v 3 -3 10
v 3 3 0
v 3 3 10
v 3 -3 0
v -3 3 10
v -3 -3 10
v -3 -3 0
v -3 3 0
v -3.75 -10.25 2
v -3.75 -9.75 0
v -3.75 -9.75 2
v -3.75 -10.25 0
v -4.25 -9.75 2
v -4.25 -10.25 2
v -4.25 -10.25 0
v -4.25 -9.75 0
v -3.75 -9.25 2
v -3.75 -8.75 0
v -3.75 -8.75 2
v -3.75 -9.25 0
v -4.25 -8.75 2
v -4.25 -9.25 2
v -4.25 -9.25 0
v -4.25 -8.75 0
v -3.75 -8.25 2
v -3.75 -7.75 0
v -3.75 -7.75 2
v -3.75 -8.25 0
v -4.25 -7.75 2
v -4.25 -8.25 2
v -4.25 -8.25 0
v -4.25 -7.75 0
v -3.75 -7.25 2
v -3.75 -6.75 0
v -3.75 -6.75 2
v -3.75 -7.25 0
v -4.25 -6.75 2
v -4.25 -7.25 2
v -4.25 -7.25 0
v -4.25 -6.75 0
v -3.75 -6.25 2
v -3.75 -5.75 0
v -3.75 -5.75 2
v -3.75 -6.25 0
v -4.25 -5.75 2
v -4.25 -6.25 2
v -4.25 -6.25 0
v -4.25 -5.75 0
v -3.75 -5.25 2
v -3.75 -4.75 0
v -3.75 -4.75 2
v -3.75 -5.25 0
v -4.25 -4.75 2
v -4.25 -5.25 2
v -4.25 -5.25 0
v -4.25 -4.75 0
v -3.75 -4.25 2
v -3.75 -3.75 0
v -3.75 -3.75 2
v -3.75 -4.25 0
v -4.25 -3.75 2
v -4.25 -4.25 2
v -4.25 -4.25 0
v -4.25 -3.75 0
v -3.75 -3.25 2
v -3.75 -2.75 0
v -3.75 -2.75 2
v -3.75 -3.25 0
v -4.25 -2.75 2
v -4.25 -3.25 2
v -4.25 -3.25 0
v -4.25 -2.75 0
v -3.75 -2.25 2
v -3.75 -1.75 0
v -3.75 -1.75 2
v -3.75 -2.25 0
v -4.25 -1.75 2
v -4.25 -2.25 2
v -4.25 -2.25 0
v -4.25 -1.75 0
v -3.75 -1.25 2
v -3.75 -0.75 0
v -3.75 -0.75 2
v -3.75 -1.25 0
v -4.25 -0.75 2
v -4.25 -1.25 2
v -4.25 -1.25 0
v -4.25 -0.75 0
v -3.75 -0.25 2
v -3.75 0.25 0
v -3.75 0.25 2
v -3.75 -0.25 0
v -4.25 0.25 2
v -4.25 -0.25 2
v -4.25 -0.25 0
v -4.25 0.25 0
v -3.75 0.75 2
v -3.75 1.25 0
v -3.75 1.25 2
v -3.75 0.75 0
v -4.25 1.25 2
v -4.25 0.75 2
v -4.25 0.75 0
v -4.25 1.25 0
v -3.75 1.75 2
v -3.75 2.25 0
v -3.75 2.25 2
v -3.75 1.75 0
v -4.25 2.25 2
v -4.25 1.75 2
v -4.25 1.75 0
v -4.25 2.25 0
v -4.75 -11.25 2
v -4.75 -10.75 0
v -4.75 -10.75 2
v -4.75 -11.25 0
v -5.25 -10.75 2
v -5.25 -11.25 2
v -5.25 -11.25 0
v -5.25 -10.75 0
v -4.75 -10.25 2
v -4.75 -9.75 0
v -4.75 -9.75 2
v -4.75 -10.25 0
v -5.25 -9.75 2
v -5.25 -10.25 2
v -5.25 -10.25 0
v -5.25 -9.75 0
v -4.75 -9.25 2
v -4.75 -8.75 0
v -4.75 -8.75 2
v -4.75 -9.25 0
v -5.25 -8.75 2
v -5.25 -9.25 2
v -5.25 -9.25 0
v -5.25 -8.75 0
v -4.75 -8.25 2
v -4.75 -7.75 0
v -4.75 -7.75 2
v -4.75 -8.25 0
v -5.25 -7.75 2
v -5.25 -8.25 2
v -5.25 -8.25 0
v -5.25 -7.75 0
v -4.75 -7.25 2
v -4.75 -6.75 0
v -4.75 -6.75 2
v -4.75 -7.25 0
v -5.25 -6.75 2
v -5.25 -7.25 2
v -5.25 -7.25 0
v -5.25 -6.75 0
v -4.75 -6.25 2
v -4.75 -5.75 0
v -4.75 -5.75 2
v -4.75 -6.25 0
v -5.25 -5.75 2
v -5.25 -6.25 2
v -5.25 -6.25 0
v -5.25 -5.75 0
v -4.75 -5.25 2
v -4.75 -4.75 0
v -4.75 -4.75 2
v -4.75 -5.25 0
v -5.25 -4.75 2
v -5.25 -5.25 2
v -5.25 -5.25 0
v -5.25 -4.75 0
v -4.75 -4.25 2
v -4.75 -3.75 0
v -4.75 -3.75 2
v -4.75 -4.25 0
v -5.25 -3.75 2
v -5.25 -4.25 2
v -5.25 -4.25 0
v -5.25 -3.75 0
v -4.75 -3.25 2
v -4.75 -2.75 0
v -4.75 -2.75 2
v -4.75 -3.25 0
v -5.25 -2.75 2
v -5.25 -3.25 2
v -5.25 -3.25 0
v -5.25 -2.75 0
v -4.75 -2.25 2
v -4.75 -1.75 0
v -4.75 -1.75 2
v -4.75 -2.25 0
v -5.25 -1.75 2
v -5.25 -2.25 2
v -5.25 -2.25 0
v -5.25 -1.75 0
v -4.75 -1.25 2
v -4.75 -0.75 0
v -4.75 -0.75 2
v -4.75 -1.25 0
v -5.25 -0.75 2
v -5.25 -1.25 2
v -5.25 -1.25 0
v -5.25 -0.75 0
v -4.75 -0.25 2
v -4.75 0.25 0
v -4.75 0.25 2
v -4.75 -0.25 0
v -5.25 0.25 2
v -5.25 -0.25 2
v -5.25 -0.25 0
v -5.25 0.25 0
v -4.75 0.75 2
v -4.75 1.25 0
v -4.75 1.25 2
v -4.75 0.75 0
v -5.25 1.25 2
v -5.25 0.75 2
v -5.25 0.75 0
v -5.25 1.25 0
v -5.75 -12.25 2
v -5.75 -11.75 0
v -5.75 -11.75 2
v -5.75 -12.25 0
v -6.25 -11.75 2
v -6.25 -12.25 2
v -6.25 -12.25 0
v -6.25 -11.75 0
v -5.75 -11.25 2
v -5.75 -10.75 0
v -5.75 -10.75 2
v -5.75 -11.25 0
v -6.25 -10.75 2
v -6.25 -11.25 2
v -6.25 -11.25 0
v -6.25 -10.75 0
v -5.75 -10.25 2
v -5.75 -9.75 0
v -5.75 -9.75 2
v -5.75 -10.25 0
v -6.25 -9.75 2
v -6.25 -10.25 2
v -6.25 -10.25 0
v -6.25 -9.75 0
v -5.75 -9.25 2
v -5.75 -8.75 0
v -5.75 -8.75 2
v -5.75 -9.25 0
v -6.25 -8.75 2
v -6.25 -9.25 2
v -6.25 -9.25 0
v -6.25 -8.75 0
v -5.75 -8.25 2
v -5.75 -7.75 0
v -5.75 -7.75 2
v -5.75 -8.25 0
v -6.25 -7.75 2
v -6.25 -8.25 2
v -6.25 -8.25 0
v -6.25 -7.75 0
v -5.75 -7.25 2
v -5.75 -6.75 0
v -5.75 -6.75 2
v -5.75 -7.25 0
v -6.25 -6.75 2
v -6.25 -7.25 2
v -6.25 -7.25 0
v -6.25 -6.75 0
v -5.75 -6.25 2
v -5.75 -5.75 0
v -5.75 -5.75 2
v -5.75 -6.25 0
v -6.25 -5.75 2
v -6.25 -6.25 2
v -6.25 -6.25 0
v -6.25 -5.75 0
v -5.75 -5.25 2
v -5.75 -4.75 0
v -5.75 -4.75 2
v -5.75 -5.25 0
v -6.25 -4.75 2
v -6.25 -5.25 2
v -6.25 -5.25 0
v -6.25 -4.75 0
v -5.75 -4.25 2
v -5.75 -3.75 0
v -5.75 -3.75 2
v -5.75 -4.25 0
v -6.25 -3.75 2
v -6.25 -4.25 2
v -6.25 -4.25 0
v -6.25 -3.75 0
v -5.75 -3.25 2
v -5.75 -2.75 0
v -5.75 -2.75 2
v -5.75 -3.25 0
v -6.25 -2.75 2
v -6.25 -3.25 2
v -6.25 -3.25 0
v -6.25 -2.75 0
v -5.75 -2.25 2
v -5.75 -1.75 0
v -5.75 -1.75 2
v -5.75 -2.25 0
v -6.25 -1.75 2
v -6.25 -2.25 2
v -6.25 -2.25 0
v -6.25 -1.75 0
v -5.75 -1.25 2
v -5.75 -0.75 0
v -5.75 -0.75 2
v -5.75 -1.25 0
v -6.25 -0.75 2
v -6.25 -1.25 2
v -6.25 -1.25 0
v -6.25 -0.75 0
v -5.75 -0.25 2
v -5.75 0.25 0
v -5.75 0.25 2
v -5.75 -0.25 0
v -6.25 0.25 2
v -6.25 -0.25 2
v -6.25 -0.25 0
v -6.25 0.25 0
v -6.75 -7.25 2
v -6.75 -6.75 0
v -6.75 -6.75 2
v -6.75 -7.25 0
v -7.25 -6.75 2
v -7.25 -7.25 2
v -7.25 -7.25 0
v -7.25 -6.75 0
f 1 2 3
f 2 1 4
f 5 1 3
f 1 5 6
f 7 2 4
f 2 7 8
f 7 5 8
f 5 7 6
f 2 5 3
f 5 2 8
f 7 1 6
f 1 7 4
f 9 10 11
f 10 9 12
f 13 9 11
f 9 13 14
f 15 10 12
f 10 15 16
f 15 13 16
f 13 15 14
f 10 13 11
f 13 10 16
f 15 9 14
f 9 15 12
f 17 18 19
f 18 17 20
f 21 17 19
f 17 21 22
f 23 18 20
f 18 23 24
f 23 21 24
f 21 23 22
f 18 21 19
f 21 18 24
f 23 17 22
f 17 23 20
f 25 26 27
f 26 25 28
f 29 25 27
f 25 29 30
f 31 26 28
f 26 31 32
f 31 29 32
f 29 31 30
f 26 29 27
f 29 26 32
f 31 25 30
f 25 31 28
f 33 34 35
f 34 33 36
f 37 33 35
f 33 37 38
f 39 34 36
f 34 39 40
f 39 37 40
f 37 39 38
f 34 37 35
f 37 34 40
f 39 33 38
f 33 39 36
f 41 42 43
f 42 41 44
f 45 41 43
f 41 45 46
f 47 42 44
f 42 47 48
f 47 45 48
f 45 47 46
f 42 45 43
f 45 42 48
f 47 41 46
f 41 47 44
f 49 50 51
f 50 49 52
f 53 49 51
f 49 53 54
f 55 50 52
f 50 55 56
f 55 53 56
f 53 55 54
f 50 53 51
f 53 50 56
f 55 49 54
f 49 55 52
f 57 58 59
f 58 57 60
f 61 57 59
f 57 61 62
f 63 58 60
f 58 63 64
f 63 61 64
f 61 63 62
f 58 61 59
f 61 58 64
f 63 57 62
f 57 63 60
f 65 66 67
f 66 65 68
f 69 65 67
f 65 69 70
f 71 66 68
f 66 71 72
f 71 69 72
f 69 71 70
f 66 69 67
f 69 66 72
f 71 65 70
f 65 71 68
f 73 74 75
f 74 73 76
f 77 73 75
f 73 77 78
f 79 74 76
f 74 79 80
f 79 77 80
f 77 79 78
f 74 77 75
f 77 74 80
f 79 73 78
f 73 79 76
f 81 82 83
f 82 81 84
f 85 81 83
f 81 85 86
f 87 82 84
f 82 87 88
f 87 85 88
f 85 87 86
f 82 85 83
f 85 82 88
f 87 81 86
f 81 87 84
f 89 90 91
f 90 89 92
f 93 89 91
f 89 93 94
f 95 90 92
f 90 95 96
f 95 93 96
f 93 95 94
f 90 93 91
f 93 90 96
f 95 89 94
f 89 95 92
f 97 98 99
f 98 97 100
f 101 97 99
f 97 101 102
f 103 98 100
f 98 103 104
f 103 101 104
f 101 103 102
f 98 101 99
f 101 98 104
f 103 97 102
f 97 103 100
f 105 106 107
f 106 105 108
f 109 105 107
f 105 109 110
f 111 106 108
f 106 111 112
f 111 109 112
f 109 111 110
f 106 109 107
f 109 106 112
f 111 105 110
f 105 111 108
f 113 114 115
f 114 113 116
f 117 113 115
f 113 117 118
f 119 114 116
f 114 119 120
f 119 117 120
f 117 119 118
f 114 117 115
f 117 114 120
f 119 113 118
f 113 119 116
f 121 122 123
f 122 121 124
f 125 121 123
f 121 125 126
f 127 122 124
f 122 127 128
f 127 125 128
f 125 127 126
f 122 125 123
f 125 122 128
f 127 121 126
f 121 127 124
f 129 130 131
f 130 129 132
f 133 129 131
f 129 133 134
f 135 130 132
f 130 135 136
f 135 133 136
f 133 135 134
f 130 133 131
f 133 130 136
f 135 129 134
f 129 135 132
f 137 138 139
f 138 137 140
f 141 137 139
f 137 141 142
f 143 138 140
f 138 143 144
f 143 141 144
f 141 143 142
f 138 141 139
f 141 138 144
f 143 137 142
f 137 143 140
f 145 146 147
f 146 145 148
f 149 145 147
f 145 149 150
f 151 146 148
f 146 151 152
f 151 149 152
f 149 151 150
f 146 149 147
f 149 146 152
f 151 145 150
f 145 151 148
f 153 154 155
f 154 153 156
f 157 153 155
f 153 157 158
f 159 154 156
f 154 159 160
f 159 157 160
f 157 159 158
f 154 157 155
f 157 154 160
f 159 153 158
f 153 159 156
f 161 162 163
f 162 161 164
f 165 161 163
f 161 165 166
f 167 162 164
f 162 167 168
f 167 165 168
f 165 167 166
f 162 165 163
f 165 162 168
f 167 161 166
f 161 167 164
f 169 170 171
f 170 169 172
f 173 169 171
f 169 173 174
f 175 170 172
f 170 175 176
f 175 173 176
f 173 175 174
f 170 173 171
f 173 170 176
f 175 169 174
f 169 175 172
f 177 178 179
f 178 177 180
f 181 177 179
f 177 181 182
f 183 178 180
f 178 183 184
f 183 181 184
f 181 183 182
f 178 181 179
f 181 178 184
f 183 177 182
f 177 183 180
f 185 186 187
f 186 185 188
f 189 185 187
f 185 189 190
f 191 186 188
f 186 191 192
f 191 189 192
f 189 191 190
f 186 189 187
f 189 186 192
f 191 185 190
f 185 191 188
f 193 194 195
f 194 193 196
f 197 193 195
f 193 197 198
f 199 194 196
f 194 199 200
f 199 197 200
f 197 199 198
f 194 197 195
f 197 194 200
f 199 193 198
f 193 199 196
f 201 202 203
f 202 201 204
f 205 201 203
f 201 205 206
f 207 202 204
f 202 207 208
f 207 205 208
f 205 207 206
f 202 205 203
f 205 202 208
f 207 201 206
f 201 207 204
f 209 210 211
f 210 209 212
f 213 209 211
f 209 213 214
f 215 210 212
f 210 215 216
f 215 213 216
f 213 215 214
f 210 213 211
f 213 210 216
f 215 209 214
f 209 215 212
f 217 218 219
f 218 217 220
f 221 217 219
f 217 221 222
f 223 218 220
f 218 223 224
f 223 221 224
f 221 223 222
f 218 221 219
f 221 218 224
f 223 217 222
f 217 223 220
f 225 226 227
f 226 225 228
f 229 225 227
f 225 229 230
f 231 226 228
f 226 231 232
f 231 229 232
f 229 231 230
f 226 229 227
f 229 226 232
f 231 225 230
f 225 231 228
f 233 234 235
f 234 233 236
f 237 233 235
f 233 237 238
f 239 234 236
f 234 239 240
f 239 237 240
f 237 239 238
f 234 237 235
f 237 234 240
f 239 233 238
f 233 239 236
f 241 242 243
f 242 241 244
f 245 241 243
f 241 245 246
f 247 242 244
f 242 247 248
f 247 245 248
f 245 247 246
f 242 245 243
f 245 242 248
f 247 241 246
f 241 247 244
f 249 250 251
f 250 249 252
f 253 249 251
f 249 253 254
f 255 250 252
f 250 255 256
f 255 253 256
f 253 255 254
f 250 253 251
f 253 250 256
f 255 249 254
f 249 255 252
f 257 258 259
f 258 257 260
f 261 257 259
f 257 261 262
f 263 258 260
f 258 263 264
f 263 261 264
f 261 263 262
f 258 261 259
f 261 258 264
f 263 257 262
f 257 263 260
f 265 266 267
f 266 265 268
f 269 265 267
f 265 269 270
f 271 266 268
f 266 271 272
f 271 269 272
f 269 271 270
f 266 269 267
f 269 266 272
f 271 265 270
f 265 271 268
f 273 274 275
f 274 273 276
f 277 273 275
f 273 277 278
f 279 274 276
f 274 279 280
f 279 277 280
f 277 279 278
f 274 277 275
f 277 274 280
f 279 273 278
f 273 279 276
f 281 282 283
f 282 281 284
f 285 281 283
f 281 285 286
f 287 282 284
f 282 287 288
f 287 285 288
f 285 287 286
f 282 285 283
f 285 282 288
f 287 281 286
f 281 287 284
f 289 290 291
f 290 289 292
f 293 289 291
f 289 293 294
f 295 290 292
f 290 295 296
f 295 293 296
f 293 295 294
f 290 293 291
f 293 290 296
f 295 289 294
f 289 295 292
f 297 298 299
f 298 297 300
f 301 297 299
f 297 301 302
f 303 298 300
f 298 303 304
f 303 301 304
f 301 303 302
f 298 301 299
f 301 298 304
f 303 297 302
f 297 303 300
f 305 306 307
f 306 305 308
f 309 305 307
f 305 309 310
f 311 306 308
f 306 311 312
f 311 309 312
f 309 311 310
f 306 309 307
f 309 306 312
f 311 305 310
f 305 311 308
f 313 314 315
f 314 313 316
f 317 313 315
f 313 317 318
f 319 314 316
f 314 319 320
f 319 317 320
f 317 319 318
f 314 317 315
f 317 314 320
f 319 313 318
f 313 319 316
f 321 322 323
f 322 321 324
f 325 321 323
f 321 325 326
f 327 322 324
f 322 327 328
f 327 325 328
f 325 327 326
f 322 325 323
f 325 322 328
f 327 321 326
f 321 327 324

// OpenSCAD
translate([0, 0, 5]) color([0,1,0,0.9]) cube([6, 6, 10], center=true);
translate([-4, -10, 1]) color([1,0,0]) cube([0.5, 0.5, 2], center=true);
translate([-4, -9, 1]) color([1,0,0]) cube([0.5, 0.5, 2], center=true);
translate([-4, -8, 1]) color([1,0,0]) cube([0.5, 0.5, 2], center=true);
translate([-4, -7, 1]) color([1,0,0]) cube([0.5, 0.5, 2], center=true);
translate([-4, -6, 1]) color([1,0,0]) cube([0.5, 0.5, 2], center=true);
translate([-4, -5, 1]) color([1,0,0]) cube([0.5, 0.5, 2], center=true);
translate([-4, -4, 1]) color([1,0,0]) cube([0.5, 0.5, 2], center=true);
translate([-4, -3, 1]) color([1,0,0]) cube([0.5, 0.5, 2], center=true);
translate([-4, -2, 1]) color([1,0,0]) cube([0.5, 0.5, 2], center=true);
translate([-4, -1, 1]) color([1,0,0]) cube([0.5, 0.5, 2], center=true);
translate([-4, 0, 1]) color([1,0,0]) cube([0.5, 0.5, 2], center=true);
translate([-4, 1, 1]) color([1,0,0]) cube([0.5, 0.5, 2], center=true);
translate([-4, 2, 1]) color([1,0,0]) cube([0.5, 0.5, 2], center=true);
translate([-5, -11, 1]) color([1,0,0]) cube([0.5, 0.5, 2], center=true);
translate([-5, -10, 1]) color([1,0,0]) cube([0.5, 0.5, 2], center=true);
translate([-5, -9, 1]) color([1,0,0]) cube([0.5, 0.5, 2], center=true);
translate([-5, -8, 1]) color([1,0,0]) cube([0.5, 0.5, 2], center=true);
translate([-5, -7, 1]) color([1,0,0]) cube([0.5, 0.5, 2], center=true);
translate([-5, -6, 1]) color([1,0,0]) cube([0.5, 0.5, 2], center=true);
translate([-5, -5, 1]) color([1,0,0]) cube([0.5, 0.5, 2], center=true);
translate([-5, -4, 1]) color([1,0,0]) cube([0.5, 0.5, 2], center=true);
translate([-5, -3, 1]) color([1,0,0]) cube([0.5, 0.5, 2], center=true);
translate([-5, -2, 1]) color([1,0,0]) cube([0.5, 0.5, 2], center=true);
translate([-5, -1, 1]) color([1,0,0]) cube([0.5, 0.5, 2], center=true);
translate([-5, 0, 1]) color([1,0,0]) cube([0.5, 0.5, 2], center=true);
translate([-5, 1, 1]) color([1,0,0]) cube([0.5, 0.5, 2], center=true);
translate([-6, -12, 1]) color([1,0,0]) cube([0.5, 0.5, 2], center=true);
translate([-6, -11, 1]) color([1,0,0]) cube([0.5, 0.5, 2], center=true);
translate([-6, -10, 1]) color([1,0,0]) cube([0.5, 0.5, 2], center=true);
translate([-6, -9, 1]) color([1,0,0]) cube([0.5, 0.5, 2], center=true);
translate([-6, -8, 1]) color([1,0,0]) cube([0.5, 0.5, 2], center=true);
translate([-6, -7, 1]) color([1,0,0]) cube([0.5, 0.5, 2], center=true);
translate([-6, -6, 1]) color([1,0,0]) cube([0.5, 0.5, 2], center=true);
translate([-6, -5, 1]) color([1,0,0]) cube([0.5, 0.5, 2], center=true);
translate([-6, -4, 1]) color([1,0,0]) cube([0.5, 0.5, 2], center=true);
translate([-6, -3, 1]) color([1,0,0]) cube([0.5, 0.5, 2], center=true);
translate([-6, -2, 1]) color([1,0,0]) cube([0.5, 0.5, 2], center=true);
translate([-6, -1, 1]) color([1,0,0]) cube([0.5, 0.5, 2], center=true);
translate([-6, 0, 1]) color([1,0,0]) cube([0.5, 0.5, 2], center=true);
translate([-7, -7, 1]) color([1,0,0]) cube([0.5, 0.5, 2], center=true);
